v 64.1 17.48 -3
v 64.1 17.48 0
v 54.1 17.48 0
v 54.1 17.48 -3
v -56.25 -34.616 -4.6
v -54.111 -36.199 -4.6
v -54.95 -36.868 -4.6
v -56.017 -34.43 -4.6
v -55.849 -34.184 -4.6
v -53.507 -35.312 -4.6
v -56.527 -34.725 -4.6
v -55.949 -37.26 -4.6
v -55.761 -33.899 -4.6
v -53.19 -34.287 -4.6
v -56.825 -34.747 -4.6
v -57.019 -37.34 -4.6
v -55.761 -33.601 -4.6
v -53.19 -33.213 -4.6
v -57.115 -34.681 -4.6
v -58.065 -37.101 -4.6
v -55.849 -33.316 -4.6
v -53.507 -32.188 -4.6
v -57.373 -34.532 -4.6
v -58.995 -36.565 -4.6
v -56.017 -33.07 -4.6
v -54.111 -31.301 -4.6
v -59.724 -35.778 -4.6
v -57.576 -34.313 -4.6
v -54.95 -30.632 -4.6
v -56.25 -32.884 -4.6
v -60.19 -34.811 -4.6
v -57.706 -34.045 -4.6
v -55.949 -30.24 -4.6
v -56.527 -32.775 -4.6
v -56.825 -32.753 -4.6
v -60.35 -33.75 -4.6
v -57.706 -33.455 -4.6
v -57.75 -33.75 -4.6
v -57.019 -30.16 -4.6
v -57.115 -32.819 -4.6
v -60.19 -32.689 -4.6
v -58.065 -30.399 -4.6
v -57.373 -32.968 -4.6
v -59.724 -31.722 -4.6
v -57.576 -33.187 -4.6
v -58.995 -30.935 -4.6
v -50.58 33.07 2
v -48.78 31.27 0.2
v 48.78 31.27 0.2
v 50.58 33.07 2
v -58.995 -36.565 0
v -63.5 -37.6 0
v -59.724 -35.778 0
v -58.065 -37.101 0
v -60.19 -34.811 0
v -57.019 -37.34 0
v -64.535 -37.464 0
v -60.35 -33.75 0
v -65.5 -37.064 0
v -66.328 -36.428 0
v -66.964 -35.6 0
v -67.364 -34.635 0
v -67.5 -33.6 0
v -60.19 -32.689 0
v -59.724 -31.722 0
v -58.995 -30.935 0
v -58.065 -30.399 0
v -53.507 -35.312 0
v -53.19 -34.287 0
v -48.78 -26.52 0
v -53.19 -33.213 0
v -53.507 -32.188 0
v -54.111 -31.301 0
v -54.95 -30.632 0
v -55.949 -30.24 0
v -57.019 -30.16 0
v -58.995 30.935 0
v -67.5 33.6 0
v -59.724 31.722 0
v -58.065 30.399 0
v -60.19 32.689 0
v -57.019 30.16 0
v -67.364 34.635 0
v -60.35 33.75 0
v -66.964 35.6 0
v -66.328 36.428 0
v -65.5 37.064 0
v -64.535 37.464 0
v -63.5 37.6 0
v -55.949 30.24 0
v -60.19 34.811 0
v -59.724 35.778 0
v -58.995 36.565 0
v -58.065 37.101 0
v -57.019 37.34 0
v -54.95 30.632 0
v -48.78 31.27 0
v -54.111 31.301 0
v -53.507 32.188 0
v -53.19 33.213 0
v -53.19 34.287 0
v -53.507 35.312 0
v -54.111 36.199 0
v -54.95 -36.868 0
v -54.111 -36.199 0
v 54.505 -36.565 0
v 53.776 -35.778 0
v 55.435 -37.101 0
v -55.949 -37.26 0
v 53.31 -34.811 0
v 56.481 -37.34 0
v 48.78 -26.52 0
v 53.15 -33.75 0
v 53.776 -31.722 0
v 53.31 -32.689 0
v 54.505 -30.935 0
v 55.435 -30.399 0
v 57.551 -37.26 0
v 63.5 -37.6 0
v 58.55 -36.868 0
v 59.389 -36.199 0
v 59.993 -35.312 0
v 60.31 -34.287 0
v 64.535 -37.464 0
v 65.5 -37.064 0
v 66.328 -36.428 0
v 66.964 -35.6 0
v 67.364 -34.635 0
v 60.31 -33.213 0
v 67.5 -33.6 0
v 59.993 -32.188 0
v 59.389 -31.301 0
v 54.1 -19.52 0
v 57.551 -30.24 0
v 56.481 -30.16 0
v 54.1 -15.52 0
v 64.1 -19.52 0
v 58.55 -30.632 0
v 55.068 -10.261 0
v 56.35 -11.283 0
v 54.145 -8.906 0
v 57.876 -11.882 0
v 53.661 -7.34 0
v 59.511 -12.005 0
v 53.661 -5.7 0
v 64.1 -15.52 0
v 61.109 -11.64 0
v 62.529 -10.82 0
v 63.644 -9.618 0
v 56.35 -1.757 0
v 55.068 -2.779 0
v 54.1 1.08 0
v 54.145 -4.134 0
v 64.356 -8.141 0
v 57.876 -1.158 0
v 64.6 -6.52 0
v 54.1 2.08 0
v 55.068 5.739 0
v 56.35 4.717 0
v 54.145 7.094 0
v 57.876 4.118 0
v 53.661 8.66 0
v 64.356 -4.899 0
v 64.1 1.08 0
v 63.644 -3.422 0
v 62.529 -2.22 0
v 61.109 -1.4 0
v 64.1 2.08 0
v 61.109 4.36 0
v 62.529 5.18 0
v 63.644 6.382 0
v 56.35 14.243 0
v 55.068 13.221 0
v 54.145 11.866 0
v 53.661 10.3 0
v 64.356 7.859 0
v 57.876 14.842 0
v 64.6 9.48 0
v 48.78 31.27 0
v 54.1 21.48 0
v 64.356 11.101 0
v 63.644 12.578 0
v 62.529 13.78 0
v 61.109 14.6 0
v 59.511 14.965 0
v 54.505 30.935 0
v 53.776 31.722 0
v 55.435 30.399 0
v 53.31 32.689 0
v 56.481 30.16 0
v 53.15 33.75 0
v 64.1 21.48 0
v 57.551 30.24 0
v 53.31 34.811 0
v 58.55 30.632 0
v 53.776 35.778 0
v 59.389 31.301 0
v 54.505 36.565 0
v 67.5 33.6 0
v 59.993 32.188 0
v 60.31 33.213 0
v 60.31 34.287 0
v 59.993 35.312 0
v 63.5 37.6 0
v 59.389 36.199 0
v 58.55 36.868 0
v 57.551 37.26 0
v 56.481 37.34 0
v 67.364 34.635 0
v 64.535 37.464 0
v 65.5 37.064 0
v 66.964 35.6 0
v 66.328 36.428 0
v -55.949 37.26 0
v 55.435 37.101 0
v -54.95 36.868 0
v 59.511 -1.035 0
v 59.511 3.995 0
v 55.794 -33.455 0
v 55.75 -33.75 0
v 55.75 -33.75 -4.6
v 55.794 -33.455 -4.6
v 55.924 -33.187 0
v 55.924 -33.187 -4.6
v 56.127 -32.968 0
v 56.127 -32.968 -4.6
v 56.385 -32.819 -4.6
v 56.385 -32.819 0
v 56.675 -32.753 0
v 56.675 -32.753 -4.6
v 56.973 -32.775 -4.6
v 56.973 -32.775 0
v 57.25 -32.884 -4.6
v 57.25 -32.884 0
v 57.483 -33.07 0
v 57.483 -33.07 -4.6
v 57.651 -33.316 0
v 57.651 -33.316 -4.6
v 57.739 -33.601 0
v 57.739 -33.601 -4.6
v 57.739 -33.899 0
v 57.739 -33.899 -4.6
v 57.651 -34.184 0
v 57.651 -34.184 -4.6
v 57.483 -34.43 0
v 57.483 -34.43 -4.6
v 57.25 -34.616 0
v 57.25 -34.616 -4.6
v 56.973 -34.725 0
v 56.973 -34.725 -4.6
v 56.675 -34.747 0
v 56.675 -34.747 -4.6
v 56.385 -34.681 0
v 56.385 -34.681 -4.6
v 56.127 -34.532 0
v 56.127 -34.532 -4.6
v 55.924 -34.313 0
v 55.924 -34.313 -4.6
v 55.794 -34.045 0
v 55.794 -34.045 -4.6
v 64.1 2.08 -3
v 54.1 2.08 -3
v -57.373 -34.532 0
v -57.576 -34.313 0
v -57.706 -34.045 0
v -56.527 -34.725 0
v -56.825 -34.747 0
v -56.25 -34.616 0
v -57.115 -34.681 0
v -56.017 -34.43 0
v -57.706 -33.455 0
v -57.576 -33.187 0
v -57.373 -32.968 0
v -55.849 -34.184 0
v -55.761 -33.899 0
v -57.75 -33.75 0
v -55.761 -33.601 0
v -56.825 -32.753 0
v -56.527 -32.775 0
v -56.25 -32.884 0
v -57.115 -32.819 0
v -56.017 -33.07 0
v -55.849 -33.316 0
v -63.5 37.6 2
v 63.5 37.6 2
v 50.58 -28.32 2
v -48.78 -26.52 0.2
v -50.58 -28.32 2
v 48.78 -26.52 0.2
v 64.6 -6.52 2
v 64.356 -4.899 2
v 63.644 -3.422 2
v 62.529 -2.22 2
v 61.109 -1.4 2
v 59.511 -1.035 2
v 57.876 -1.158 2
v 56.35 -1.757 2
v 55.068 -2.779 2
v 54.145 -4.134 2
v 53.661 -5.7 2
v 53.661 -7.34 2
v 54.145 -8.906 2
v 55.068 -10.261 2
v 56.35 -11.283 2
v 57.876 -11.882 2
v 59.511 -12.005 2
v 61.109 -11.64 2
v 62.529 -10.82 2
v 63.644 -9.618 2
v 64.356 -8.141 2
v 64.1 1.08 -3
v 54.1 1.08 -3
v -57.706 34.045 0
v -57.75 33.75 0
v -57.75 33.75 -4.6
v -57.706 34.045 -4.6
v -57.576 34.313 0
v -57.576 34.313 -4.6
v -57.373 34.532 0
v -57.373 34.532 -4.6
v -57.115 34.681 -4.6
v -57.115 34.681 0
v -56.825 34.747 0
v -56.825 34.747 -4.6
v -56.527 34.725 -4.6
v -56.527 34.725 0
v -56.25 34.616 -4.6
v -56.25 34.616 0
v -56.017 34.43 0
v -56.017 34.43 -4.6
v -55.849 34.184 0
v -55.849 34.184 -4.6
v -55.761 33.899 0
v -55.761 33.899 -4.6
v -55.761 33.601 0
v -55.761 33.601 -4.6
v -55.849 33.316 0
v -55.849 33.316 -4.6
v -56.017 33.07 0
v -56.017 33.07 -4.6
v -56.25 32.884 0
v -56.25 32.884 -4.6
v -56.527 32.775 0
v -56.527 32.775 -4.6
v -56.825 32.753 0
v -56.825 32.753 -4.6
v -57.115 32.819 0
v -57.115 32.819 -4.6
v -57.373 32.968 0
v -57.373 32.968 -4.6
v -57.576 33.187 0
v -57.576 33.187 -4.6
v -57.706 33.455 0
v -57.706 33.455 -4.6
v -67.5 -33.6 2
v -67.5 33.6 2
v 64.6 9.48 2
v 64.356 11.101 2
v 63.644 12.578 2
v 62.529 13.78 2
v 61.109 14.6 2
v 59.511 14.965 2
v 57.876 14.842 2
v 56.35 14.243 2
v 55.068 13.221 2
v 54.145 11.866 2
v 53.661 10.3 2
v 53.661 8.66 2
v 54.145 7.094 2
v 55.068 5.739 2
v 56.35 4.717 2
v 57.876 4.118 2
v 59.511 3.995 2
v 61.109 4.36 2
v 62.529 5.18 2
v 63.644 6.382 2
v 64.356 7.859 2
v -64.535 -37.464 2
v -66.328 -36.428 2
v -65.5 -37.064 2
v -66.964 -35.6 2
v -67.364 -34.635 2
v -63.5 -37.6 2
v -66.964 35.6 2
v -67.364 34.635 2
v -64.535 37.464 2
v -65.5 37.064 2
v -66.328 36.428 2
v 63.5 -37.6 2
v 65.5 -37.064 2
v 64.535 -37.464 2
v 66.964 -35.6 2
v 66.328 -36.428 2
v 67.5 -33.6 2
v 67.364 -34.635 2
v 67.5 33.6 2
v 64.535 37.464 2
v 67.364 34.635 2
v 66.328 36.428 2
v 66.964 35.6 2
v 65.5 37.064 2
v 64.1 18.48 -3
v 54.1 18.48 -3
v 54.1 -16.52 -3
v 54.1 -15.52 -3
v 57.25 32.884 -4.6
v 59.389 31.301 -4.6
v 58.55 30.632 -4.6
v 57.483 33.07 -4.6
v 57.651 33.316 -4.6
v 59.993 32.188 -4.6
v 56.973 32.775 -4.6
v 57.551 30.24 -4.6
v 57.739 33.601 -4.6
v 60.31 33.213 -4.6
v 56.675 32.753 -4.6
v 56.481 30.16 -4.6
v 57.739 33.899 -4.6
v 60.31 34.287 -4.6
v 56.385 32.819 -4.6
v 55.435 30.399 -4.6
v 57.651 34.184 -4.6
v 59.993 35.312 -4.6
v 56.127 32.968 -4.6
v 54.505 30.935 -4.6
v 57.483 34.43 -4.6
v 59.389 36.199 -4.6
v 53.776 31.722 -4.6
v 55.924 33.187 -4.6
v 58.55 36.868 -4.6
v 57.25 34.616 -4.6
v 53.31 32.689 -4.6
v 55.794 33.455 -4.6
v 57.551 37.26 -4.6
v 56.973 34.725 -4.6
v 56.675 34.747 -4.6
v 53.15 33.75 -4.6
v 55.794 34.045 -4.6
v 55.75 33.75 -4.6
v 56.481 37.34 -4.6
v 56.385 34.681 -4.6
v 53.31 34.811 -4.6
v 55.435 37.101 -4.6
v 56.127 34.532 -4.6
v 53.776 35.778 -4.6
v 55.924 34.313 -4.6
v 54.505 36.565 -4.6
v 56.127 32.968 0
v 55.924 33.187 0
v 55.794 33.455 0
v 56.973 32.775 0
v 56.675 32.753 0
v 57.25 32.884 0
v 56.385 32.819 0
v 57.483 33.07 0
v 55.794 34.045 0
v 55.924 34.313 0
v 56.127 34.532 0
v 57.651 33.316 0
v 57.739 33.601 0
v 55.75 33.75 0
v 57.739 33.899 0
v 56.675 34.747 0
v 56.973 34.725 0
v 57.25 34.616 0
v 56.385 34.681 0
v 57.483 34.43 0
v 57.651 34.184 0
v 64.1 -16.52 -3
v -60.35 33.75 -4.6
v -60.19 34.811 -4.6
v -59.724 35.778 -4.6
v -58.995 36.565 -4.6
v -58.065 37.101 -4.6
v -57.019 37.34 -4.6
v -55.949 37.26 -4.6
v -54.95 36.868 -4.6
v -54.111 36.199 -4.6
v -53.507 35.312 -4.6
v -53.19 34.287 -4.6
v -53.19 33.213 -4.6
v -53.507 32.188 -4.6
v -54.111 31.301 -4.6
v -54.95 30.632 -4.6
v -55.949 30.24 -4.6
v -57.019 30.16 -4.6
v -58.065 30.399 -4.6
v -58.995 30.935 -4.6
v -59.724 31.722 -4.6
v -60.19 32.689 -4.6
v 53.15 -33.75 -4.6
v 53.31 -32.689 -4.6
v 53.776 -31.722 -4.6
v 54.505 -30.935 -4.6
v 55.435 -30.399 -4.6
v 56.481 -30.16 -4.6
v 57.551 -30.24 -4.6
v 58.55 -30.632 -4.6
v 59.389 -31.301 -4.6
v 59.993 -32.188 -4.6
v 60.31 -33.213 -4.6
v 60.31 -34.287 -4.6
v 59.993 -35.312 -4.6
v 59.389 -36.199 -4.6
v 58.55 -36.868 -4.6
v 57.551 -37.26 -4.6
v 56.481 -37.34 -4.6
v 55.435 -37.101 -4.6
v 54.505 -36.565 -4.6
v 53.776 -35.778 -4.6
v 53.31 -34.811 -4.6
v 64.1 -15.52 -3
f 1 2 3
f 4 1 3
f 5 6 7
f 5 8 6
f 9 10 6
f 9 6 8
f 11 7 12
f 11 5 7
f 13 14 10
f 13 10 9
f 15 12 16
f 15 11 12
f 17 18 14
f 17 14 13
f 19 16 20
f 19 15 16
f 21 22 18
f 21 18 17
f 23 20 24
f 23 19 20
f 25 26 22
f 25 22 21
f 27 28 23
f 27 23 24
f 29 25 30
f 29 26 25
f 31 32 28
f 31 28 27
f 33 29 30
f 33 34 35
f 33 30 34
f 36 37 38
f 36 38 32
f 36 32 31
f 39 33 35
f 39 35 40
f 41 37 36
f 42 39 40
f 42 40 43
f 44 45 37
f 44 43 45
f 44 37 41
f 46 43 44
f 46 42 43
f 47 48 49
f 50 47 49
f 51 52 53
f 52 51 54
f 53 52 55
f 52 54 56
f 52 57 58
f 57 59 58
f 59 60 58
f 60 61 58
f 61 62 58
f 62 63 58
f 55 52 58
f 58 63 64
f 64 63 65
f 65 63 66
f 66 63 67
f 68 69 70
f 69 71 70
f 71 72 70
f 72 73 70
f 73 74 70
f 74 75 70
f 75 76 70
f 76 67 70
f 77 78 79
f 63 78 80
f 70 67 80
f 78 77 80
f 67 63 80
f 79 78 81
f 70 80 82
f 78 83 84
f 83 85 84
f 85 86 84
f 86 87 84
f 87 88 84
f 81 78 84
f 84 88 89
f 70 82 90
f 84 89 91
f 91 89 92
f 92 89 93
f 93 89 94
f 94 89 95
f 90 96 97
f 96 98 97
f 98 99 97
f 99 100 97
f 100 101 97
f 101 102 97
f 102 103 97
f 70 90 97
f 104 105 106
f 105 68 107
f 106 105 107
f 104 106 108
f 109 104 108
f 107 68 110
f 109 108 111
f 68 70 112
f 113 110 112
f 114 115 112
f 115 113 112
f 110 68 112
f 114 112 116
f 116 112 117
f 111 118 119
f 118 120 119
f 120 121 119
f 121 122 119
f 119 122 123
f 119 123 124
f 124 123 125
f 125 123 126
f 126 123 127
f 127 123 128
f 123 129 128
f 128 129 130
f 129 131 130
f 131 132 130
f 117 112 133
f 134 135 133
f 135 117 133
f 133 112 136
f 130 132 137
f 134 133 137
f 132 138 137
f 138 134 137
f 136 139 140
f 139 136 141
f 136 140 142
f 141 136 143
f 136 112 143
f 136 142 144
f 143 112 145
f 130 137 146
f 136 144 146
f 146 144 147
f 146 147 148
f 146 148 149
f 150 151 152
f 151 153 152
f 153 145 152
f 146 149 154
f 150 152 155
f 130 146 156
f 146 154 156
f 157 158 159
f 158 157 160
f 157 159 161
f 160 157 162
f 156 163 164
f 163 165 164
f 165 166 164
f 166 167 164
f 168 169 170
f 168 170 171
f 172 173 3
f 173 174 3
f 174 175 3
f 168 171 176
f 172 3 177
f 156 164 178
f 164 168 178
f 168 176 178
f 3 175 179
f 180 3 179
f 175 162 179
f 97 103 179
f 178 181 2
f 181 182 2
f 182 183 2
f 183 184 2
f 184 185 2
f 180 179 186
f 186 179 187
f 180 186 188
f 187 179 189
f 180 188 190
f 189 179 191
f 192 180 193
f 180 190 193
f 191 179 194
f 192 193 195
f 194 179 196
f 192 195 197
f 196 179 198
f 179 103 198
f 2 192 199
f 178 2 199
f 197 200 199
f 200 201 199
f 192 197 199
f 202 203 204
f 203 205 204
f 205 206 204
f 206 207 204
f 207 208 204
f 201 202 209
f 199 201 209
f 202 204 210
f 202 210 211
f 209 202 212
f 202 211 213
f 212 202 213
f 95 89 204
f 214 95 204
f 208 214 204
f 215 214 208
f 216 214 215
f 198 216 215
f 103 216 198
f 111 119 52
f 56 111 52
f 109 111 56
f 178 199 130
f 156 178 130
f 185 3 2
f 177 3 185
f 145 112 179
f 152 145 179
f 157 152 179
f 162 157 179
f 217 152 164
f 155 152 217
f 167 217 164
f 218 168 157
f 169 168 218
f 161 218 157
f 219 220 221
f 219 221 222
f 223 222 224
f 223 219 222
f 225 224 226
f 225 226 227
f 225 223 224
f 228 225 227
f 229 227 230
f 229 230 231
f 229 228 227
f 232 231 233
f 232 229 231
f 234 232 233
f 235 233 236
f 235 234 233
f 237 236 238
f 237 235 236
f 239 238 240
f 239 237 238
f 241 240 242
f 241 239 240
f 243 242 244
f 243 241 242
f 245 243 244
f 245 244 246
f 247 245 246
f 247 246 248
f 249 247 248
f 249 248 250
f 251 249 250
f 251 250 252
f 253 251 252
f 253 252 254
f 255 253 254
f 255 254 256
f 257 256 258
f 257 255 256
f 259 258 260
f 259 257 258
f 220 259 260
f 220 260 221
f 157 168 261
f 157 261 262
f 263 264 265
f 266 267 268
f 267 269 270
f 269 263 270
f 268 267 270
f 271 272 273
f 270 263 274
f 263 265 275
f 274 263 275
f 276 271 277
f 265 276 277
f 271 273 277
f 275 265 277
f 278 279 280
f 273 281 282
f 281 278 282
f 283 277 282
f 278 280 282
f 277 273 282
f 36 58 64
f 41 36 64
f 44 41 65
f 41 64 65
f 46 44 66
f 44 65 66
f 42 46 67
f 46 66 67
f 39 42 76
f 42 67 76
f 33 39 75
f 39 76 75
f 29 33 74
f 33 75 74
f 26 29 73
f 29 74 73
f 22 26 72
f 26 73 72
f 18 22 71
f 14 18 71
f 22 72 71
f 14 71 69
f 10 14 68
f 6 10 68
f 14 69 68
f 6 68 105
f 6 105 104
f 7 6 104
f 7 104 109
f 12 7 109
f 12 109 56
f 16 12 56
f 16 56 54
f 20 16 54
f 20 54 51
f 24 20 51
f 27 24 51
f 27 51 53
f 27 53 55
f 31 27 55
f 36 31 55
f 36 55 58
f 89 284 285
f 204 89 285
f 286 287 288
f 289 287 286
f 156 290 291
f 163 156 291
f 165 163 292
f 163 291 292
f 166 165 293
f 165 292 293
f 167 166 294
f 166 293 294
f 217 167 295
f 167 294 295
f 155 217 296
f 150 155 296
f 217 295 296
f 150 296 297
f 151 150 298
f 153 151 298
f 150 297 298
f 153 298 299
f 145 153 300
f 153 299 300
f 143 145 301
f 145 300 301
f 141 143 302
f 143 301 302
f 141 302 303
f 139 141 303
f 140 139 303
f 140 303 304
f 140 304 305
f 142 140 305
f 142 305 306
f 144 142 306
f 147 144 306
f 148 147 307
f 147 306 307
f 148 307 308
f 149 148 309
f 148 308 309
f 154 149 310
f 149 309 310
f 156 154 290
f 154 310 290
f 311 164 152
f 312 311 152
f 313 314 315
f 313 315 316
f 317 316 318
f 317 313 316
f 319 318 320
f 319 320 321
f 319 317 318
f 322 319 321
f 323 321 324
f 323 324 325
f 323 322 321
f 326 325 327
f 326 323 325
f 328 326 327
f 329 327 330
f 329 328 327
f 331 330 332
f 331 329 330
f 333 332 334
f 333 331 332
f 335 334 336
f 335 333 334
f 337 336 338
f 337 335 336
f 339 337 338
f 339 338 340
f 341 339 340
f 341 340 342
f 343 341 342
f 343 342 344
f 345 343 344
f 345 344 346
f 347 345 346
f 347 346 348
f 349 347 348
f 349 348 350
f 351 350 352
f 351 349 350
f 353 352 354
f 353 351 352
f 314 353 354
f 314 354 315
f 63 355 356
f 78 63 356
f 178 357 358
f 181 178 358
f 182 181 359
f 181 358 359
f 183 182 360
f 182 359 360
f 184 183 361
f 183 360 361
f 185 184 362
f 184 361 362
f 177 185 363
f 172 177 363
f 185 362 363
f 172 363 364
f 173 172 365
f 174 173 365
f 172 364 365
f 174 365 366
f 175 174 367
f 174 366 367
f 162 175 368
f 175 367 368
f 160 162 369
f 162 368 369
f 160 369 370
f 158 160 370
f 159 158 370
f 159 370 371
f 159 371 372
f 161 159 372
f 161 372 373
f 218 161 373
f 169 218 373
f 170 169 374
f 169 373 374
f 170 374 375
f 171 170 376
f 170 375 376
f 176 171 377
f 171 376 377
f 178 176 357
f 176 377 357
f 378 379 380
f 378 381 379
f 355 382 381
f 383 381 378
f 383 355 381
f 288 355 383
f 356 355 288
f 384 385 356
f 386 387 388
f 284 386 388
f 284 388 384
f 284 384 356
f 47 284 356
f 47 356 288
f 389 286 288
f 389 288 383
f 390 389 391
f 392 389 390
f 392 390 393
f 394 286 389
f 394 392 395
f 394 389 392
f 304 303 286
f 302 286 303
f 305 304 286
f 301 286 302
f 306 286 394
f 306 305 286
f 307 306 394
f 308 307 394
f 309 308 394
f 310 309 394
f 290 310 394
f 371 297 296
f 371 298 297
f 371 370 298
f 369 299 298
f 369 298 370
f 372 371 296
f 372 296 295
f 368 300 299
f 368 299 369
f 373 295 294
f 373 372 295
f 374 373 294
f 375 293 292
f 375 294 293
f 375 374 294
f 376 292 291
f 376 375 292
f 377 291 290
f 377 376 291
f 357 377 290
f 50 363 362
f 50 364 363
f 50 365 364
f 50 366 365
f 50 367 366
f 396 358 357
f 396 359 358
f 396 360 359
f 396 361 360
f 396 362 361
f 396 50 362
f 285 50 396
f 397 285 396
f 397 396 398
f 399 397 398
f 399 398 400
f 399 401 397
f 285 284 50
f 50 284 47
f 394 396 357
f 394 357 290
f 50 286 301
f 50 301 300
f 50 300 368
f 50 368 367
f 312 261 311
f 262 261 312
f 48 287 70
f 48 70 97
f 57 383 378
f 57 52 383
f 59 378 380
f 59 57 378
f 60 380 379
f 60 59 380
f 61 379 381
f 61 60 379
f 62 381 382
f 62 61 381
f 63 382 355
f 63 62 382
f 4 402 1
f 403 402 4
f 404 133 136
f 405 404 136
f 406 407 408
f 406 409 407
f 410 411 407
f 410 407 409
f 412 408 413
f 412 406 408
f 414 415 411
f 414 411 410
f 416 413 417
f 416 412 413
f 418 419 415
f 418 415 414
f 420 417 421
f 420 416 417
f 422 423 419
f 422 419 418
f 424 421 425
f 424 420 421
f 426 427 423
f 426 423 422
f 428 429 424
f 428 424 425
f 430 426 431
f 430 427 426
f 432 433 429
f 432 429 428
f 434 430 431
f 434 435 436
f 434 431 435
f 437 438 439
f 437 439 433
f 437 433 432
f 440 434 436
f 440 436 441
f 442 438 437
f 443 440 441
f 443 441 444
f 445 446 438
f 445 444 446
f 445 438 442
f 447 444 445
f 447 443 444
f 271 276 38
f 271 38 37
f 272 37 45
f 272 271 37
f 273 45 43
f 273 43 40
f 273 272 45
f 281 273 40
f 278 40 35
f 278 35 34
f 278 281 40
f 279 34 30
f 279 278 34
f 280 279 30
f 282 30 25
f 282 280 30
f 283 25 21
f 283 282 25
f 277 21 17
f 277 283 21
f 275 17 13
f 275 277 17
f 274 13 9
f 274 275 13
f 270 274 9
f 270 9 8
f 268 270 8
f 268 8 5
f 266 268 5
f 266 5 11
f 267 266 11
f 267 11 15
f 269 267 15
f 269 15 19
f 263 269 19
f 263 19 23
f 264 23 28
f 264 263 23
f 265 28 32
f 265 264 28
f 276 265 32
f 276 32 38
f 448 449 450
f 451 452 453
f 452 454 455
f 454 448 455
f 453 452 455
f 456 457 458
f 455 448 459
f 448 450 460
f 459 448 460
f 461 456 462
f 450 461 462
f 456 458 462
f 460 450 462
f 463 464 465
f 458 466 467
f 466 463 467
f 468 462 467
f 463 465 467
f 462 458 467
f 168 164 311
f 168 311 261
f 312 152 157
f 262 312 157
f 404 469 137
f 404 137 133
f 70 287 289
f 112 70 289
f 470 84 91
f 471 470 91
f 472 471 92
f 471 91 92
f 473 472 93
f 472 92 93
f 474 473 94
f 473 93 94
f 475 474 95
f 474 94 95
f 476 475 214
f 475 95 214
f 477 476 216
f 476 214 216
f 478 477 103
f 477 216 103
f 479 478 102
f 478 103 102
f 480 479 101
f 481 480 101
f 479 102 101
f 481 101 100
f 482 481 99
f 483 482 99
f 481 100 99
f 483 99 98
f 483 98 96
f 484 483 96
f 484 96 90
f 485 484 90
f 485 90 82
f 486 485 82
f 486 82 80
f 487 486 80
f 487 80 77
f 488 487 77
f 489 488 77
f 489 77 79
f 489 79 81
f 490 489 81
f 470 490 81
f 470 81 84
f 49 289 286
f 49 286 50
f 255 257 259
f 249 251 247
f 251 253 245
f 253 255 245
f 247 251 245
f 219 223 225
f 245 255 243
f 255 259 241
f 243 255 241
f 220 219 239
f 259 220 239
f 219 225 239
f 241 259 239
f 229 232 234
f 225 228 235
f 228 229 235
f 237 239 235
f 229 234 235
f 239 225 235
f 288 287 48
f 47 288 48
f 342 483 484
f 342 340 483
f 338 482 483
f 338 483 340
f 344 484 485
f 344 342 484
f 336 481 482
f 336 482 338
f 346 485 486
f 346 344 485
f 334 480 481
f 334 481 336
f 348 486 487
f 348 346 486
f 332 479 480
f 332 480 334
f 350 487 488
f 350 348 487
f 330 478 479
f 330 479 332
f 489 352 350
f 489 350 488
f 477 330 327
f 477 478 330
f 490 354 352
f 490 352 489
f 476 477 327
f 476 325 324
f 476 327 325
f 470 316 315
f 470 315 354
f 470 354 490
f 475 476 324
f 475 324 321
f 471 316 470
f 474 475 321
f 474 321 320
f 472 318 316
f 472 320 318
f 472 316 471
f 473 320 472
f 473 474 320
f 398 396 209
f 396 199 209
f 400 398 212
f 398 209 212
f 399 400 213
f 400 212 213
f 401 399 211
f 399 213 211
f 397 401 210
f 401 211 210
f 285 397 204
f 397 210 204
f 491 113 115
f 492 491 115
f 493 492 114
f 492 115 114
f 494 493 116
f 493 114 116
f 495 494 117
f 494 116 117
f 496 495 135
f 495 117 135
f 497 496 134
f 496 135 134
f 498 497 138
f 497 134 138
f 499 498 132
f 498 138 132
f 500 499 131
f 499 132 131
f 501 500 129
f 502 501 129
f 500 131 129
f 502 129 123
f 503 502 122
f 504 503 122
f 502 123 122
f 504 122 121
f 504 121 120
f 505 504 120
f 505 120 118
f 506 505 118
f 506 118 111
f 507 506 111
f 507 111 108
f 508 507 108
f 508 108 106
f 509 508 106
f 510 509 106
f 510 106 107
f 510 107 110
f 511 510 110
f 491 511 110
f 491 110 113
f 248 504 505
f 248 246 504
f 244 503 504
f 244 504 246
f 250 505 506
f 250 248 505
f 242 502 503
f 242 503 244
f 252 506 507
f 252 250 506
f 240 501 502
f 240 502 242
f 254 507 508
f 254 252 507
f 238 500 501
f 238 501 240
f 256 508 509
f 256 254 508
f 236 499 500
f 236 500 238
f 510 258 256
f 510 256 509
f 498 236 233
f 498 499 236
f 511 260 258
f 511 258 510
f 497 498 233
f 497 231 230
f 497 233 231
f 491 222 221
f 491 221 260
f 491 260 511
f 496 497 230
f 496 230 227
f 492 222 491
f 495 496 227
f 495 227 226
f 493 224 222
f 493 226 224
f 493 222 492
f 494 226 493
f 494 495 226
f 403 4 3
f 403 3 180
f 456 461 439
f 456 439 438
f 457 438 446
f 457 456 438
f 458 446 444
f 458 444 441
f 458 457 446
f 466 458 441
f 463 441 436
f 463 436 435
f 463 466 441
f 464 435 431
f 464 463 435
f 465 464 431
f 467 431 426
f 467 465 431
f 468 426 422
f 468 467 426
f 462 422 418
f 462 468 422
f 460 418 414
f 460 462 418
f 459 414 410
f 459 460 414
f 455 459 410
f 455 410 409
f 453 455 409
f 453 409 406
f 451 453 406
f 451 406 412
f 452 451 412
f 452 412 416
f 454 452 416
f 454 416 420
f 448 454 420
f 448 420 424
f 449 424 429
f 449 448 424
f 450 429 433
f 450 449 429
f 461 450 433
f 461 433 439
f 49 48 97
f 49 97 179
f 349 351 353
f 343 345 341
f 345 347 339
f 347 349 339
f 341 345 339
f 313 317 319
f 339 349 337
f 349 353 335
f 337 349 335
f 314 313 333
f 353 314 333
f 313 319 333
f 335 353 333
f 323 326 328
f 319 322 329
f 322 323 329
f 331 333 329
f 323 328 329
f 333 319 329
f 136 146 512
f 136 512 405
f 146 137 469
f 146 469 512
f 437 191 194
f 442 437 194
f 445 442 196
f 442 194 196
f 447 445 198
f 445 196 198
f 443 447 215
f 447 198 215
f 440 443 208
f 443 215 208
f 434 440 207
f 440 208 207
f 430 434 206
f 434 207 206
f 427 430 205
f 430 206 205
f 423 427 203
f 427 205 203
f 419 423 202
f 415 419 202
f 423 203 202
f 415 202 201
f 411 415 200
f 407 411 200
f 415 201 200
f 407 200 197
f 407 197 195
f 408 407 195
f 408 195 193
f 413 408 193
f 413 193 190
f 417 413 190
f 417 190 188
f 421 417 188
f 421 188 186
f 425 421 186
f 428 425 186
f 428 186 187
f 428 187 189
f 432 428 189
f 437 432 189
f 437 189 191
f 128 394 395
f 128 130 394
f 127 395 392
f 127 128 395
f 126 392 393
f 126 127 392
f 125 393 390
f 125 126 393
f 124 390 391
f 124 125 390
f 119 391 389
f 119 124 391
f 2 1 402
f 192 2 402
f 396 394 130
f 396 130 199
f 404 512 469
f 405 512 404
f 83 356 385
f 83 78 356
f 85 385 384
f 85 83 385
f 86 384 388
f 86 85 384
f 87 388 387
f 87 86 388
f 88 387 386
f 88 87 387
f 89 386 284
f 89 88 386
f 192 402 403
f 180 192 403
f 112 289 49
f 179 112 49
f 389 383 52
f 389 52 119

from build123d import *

# Parameters (mm, degrees)
SKETCH_3_W            = 95.96
SKETCH_3_H            = 56.19
EXTRUDE_2_DEPTH       = 2
SKETCH_4_W            = 97.56
SKETCH_4_H            = 57.79
SKETCH_4_W_2          = 95.96
SKETCH_4_H_2          = 56.19
CUT_EXTRUDE_1_DEPTH   = 2
SKETCH_5_R            = 3.6
SKETCH_5_R_2          = 2.4
EXTRUDE_1_DEPTH       = 4.6
EXTRUDE_START         = -2
EXTRUDE_3_DEPTH       = 2
CHAMFER_1_SIZE        = 1.8
SKETCH_8_W            = 10
SKETCH_8_H            = 75.2
EXTRUDE_3_2_DEPTH     = 2
FILLET_1_R            = 4
SKETCH_9_R            = 5.5
CUT_EXTRUDE_1_2_DEPTH = 2
SKETCH_11_R           = 2.4
SKETCH_11_R_2         = 1
EXTRUDE_4_DEPTH       = 4.6
SKETCH_14_W           = 10
SKETCH_14_H           = 1
EXTRUDE_4_2_DEPTH     = 3
CHAMFER_2_SIZE        = 3
CHAMFER_3_SIZE        = 3


with BuildPart() as part:
    # Эскиз3 → Бобышка-Вытянуть2 (new body)
    with BuildSketch(Plane.XY):
        with BuildLine():
            Line((-57.5, -37), (57.5, -37))
            ThreePointArc((57.5, -37), (59.267766953, -36.267766953), (60, -34.5))
            Line((60, -34.5), (60, 34.5))
            ThreePointArc((60, 34.5), (59.267766953, 36.267766953), (57.5, 37))
            Line((57.5, 37), (-57.5, 37))
            ThreePointArc((-57.5, 37), (-59.267766953, 36.267766953), (-60, 34.5))
            Line((-60, 34.5), (-60, -34.5))
            ThreePointArc((-60, -34.5), (-59.267766953, -36.267766953), (-57.5, -37))
        make_face()
        with Locations((0, 2.375)):
            Rectangle(SKETCH_3_W, SKETCH_3_H, mode=Mode.SUBTRACT)
    extrude(amount=EXTRUDE_2_DEPTH)

    # Эскиз4 → Cut-Extrude 1 (cut)
    with BuildSketch(Plane.XY.offset(2)):
        with Locations((0, 2.375)):
            Rectangle(SKETCH_4_W, SKETCH_4_H)
        with Locations((0, 2.375)):
            Rectangle(SKETCH_4_W_2, SKETCH_4_H_2, mode=Mode.SUBTRACT)
    extrude(amount=-CUT_EXTRUDE_1_DEPTH, mode=Mode.SUBTRACT)

    # Эскиз5 → Вытянуть-Тонкостенный1 (add)
    # profile 1 of 4: a face of its own
    with BuildSketch(Plane(origin=(0, 0, 0), x_dir=(-1, 0, 0), z_dir=(0, 0, -1))):
        with Locations((56.75, 33.75)):
            Circle(SKETCH_5_R)
        with Locations((56.75, 33.75)):
            Circle(SKETCH_5_R_2, mode=Mode.SUBTRACT)
    # profile 2 of 4: a face of its own
    with BuildSketch(Plane(origin=(0, 0, 0), x_dir=(-1, 0, 0), z_dir=(0, 0, -1))):
        with Locations((-56.75, 33.75)):
            Circle(SKETCH_5_R)
        with Locations((-56.75, 33.75)):
            Circle(SKETCH_5_R_2, mode=Mode.SUBTRACT)
    # profile 3 of 4: a face of its own
    with BuildSketch(Plane(origin=(0, 0, 0), x_dir=(-1, 0, 0), z_dir=(0, 0, -1))):
        with Locations((-56.75, -33.75)):
            Circle(SKETCH_5_R)
        with Locations((-56.75, -33.75)):
            Circle(SKETCH_5_R_2, mode=Mode.SUBTRACT)
    # profile 4 of 4: a face of its own
    with BuildSketch(Plane(origin=(0, 0, 0), x_dir=(-1, 0, 0), z_dir=(0, 0, -1))):
        with Locations((56.75, -33.75)):
            Circle(SKETCH_5_R)
        with Locations((56.75, -33.75)):
            Circle(SKETCH_5_R_2, mode=Mode.SUBTRACT)
    extrude(amount=EXTRUDE_1_DEPTH)

    # Эскиз7 → Extrude 3 (add)
    with BuildSketch(Plane.XY.offset(2).offset(EXTRUDE_START)):
        with BuildLine():
            Line((-60.6, 34.5), (-60.6, -34.5))
            ThreePointArc((-60.6, -34.5), (-59.692031022, -36.692031022), (-57.5, -37.6))
            Line((-57.5, -37.6), (57.5, -37.6))
            ThreePointArc((57.5, -37.6), (59.692031022, -36.692031022), (60.6, -34.5))
            Line((60.6, -34.5), (60.6, 34.5))
            ThreePointArc((60.6, 34.5), (59.692031022, 36.692031022), (57.5, 37.6))
            Line((57.5, 37.6), (-57.5, 37.6))
            ThreePointArc((-57.5, 37.6), (-59.692031022, 36.692031022), (-60.6, 34.5))
        make_face()
        with BuildLine():
            Line((-60, 34.5), (-60, -34.5))
            ThreePointArc((-60, -34.5), (-59.267766953, -36.267766953), (-57.5, -37))
            Line((-57.5, -37), (57.5, -37))
            ThreePointArc((57.5, -37), (59.267766953, -36.267766953), (60, -34.5))
            Line((60, -34.5), (60, 34.5))
            ThreePointArc((60, 34.5), (59.267766953, 36.267766953), (57.5, 37))
            Line((57.5, 37), (-57.5, 37))
            ThreePointArc((-57.5, 37), (-59.267766953, 36.267766953), (-60, 34.5))
        make_face(mode=Mode.SUBTRACT)
    extrude(amount=EXTRUDE_3_DEPTH)

    # Фаска1
    chamfer_1_edges = [part.edges().sort_by_distance(p)[0] for p in [
        (0, 31.27, 2),
        (-48.78, 2.375, 2),
        (0, -26.52, 2),
        (48.78, 2.375, 2),
    ]]
    chamfer(chamfer_1_edges, length=CHAMFER_1_SIZE)

    # Эскиз8 → Extrude 3 2 (add)
    with BuildSketch(Plane.XY.offset(2)):
        with Locations((62.5, 0)):
            Rectangle(SKETCH_8_W, SKETCH_8_H)
        with Locations((-62.5, 0)):
            Rectangle(SKETCH_8_W, SKETCH_8_H)
    extrude(amount=-EXTRUDE_3_2_DEPTH)

    # Скругление1
    fillet_1_edges = [part.edges().sort_by_distance(p)[0] for p in [
        (67.5, 37.6, 1),
        (67.5, -37.6, 1),
        (-67.5, -37.6, 1),
        (-67.5, 37.6, 1),
    ]]
    fillet(fillet_1_edges, radius=FILLET_1_R)

    # Эскиз9 → Cut-Extrude 1 2 (cut)
    with BuildSketch(Plane.XY.offset(2)):
        with Locations((59.1, 9.48)):
            Circle(SKETCH_9_R)
        with Locations((59.1, -6.52)):
            Circle(SKETCH_9_R)
    extrude(amount=-CUT_EXTRUDE_1_2_DEPTH, mode=Mode.SUBTRACT)

    # Эскиз11 → Extrude 4 (add)
    # profile 1 of 4: a face of its own
    with BuildSketch(Plane(origin=(0, 0, 0), x_dir=(-1, 0, 0), z_dir=(0, 0, -1))):
        with Locations((-56.75, 33.75)):
            Circle(SKETCH_11_R)
        with Locations((-56.75, 33.75)):
            Circle(SKETCH_11_R_2, mode=Mode.SUBTRACT)
    # profile 2 of 4: a face of its own
    with BuildSketch(Plane(origin=(0, 0, 0), x_dir=(-1, 0, 0), z_dir=(0, 0, -1))):
        with Locations((56.75, 33.75)):
            Circle(SKETCH_11_R)
        with Locations((56.75, 33.75)):
            Circle(SKETCH_11_R_2, mode=Mode.SUBTRACT)
    # profile 3 of 4: a face of its own
    with BuildSketch(Plane(origin=(0, 0, 0), x_dir=(-1, 0, 0), z_dir=(0, 0, -1))):
        with Locations((56.75, -33.75)):
            Circle(SKETCH_11_R)
        with Locations((56.75, -33.75)):
            Circle(SKETCH_11_R_2, mode=Mode.SUBTRACT)
    # profile 4 of 4: a face of its own
    with BuildSketch(Plane(origin=(0, 0, 0), x_dir=(-1, 0, 0), z_dir=(0, 0, -1))):
        with Locations((-56.75, -33.75)):
            Circle(SKETCH_11_R)
        with Locations((-56.75, -33.75)):
            Circle(SKETCH_11_R_2, mode=Mode.SUBTRACT)
    extrude(amount=EXTRUDE_4_DEPTH)

    # Эскиз14 → Extrude 4 2 (add)
    with BuildSketch(Plane(origin=(0, 0, 0), x_dir=(-1, 0, 0), z_dir=(0, 0, -1))):
        with Locations((-59.1, 17.98)):
            Rectangle(SKETCH_14_W, SKETCH_14_H)
        with Locations((-59.1, 1.58)):
            Rectangle(SKETCH_14_W, SKETCH_14_H)
        with Locations((-59.1, -16.02)):
            Rectangle(SKETCH_14_W, SKETCH_14_H)
    extrude(amount=EXTRUDE_4_2_DEPTH)

    # Фаска2
    chamfer_2_edges = [part.edges().sort_by_distance(p)[0] for p in [
        (59.1, 18.48, 0),
    ]]
    chamfer(chamfer_2_edges, length=CHAMFER_2_SIZE - 0.0001)  # a hair under: the kernel refuses the full size

    # Фаска3
    chamfer_3_edges = [part.edges().sort_by_distance(p)[0] for p in [
        (59.1, -16.52, 0),
    ]]
    chamfer(chamfer_3_edges, length=CHAMFER_3_SIZE - 0.0001)  # a hair under: the kernel refuses the full size


solid = part.part
